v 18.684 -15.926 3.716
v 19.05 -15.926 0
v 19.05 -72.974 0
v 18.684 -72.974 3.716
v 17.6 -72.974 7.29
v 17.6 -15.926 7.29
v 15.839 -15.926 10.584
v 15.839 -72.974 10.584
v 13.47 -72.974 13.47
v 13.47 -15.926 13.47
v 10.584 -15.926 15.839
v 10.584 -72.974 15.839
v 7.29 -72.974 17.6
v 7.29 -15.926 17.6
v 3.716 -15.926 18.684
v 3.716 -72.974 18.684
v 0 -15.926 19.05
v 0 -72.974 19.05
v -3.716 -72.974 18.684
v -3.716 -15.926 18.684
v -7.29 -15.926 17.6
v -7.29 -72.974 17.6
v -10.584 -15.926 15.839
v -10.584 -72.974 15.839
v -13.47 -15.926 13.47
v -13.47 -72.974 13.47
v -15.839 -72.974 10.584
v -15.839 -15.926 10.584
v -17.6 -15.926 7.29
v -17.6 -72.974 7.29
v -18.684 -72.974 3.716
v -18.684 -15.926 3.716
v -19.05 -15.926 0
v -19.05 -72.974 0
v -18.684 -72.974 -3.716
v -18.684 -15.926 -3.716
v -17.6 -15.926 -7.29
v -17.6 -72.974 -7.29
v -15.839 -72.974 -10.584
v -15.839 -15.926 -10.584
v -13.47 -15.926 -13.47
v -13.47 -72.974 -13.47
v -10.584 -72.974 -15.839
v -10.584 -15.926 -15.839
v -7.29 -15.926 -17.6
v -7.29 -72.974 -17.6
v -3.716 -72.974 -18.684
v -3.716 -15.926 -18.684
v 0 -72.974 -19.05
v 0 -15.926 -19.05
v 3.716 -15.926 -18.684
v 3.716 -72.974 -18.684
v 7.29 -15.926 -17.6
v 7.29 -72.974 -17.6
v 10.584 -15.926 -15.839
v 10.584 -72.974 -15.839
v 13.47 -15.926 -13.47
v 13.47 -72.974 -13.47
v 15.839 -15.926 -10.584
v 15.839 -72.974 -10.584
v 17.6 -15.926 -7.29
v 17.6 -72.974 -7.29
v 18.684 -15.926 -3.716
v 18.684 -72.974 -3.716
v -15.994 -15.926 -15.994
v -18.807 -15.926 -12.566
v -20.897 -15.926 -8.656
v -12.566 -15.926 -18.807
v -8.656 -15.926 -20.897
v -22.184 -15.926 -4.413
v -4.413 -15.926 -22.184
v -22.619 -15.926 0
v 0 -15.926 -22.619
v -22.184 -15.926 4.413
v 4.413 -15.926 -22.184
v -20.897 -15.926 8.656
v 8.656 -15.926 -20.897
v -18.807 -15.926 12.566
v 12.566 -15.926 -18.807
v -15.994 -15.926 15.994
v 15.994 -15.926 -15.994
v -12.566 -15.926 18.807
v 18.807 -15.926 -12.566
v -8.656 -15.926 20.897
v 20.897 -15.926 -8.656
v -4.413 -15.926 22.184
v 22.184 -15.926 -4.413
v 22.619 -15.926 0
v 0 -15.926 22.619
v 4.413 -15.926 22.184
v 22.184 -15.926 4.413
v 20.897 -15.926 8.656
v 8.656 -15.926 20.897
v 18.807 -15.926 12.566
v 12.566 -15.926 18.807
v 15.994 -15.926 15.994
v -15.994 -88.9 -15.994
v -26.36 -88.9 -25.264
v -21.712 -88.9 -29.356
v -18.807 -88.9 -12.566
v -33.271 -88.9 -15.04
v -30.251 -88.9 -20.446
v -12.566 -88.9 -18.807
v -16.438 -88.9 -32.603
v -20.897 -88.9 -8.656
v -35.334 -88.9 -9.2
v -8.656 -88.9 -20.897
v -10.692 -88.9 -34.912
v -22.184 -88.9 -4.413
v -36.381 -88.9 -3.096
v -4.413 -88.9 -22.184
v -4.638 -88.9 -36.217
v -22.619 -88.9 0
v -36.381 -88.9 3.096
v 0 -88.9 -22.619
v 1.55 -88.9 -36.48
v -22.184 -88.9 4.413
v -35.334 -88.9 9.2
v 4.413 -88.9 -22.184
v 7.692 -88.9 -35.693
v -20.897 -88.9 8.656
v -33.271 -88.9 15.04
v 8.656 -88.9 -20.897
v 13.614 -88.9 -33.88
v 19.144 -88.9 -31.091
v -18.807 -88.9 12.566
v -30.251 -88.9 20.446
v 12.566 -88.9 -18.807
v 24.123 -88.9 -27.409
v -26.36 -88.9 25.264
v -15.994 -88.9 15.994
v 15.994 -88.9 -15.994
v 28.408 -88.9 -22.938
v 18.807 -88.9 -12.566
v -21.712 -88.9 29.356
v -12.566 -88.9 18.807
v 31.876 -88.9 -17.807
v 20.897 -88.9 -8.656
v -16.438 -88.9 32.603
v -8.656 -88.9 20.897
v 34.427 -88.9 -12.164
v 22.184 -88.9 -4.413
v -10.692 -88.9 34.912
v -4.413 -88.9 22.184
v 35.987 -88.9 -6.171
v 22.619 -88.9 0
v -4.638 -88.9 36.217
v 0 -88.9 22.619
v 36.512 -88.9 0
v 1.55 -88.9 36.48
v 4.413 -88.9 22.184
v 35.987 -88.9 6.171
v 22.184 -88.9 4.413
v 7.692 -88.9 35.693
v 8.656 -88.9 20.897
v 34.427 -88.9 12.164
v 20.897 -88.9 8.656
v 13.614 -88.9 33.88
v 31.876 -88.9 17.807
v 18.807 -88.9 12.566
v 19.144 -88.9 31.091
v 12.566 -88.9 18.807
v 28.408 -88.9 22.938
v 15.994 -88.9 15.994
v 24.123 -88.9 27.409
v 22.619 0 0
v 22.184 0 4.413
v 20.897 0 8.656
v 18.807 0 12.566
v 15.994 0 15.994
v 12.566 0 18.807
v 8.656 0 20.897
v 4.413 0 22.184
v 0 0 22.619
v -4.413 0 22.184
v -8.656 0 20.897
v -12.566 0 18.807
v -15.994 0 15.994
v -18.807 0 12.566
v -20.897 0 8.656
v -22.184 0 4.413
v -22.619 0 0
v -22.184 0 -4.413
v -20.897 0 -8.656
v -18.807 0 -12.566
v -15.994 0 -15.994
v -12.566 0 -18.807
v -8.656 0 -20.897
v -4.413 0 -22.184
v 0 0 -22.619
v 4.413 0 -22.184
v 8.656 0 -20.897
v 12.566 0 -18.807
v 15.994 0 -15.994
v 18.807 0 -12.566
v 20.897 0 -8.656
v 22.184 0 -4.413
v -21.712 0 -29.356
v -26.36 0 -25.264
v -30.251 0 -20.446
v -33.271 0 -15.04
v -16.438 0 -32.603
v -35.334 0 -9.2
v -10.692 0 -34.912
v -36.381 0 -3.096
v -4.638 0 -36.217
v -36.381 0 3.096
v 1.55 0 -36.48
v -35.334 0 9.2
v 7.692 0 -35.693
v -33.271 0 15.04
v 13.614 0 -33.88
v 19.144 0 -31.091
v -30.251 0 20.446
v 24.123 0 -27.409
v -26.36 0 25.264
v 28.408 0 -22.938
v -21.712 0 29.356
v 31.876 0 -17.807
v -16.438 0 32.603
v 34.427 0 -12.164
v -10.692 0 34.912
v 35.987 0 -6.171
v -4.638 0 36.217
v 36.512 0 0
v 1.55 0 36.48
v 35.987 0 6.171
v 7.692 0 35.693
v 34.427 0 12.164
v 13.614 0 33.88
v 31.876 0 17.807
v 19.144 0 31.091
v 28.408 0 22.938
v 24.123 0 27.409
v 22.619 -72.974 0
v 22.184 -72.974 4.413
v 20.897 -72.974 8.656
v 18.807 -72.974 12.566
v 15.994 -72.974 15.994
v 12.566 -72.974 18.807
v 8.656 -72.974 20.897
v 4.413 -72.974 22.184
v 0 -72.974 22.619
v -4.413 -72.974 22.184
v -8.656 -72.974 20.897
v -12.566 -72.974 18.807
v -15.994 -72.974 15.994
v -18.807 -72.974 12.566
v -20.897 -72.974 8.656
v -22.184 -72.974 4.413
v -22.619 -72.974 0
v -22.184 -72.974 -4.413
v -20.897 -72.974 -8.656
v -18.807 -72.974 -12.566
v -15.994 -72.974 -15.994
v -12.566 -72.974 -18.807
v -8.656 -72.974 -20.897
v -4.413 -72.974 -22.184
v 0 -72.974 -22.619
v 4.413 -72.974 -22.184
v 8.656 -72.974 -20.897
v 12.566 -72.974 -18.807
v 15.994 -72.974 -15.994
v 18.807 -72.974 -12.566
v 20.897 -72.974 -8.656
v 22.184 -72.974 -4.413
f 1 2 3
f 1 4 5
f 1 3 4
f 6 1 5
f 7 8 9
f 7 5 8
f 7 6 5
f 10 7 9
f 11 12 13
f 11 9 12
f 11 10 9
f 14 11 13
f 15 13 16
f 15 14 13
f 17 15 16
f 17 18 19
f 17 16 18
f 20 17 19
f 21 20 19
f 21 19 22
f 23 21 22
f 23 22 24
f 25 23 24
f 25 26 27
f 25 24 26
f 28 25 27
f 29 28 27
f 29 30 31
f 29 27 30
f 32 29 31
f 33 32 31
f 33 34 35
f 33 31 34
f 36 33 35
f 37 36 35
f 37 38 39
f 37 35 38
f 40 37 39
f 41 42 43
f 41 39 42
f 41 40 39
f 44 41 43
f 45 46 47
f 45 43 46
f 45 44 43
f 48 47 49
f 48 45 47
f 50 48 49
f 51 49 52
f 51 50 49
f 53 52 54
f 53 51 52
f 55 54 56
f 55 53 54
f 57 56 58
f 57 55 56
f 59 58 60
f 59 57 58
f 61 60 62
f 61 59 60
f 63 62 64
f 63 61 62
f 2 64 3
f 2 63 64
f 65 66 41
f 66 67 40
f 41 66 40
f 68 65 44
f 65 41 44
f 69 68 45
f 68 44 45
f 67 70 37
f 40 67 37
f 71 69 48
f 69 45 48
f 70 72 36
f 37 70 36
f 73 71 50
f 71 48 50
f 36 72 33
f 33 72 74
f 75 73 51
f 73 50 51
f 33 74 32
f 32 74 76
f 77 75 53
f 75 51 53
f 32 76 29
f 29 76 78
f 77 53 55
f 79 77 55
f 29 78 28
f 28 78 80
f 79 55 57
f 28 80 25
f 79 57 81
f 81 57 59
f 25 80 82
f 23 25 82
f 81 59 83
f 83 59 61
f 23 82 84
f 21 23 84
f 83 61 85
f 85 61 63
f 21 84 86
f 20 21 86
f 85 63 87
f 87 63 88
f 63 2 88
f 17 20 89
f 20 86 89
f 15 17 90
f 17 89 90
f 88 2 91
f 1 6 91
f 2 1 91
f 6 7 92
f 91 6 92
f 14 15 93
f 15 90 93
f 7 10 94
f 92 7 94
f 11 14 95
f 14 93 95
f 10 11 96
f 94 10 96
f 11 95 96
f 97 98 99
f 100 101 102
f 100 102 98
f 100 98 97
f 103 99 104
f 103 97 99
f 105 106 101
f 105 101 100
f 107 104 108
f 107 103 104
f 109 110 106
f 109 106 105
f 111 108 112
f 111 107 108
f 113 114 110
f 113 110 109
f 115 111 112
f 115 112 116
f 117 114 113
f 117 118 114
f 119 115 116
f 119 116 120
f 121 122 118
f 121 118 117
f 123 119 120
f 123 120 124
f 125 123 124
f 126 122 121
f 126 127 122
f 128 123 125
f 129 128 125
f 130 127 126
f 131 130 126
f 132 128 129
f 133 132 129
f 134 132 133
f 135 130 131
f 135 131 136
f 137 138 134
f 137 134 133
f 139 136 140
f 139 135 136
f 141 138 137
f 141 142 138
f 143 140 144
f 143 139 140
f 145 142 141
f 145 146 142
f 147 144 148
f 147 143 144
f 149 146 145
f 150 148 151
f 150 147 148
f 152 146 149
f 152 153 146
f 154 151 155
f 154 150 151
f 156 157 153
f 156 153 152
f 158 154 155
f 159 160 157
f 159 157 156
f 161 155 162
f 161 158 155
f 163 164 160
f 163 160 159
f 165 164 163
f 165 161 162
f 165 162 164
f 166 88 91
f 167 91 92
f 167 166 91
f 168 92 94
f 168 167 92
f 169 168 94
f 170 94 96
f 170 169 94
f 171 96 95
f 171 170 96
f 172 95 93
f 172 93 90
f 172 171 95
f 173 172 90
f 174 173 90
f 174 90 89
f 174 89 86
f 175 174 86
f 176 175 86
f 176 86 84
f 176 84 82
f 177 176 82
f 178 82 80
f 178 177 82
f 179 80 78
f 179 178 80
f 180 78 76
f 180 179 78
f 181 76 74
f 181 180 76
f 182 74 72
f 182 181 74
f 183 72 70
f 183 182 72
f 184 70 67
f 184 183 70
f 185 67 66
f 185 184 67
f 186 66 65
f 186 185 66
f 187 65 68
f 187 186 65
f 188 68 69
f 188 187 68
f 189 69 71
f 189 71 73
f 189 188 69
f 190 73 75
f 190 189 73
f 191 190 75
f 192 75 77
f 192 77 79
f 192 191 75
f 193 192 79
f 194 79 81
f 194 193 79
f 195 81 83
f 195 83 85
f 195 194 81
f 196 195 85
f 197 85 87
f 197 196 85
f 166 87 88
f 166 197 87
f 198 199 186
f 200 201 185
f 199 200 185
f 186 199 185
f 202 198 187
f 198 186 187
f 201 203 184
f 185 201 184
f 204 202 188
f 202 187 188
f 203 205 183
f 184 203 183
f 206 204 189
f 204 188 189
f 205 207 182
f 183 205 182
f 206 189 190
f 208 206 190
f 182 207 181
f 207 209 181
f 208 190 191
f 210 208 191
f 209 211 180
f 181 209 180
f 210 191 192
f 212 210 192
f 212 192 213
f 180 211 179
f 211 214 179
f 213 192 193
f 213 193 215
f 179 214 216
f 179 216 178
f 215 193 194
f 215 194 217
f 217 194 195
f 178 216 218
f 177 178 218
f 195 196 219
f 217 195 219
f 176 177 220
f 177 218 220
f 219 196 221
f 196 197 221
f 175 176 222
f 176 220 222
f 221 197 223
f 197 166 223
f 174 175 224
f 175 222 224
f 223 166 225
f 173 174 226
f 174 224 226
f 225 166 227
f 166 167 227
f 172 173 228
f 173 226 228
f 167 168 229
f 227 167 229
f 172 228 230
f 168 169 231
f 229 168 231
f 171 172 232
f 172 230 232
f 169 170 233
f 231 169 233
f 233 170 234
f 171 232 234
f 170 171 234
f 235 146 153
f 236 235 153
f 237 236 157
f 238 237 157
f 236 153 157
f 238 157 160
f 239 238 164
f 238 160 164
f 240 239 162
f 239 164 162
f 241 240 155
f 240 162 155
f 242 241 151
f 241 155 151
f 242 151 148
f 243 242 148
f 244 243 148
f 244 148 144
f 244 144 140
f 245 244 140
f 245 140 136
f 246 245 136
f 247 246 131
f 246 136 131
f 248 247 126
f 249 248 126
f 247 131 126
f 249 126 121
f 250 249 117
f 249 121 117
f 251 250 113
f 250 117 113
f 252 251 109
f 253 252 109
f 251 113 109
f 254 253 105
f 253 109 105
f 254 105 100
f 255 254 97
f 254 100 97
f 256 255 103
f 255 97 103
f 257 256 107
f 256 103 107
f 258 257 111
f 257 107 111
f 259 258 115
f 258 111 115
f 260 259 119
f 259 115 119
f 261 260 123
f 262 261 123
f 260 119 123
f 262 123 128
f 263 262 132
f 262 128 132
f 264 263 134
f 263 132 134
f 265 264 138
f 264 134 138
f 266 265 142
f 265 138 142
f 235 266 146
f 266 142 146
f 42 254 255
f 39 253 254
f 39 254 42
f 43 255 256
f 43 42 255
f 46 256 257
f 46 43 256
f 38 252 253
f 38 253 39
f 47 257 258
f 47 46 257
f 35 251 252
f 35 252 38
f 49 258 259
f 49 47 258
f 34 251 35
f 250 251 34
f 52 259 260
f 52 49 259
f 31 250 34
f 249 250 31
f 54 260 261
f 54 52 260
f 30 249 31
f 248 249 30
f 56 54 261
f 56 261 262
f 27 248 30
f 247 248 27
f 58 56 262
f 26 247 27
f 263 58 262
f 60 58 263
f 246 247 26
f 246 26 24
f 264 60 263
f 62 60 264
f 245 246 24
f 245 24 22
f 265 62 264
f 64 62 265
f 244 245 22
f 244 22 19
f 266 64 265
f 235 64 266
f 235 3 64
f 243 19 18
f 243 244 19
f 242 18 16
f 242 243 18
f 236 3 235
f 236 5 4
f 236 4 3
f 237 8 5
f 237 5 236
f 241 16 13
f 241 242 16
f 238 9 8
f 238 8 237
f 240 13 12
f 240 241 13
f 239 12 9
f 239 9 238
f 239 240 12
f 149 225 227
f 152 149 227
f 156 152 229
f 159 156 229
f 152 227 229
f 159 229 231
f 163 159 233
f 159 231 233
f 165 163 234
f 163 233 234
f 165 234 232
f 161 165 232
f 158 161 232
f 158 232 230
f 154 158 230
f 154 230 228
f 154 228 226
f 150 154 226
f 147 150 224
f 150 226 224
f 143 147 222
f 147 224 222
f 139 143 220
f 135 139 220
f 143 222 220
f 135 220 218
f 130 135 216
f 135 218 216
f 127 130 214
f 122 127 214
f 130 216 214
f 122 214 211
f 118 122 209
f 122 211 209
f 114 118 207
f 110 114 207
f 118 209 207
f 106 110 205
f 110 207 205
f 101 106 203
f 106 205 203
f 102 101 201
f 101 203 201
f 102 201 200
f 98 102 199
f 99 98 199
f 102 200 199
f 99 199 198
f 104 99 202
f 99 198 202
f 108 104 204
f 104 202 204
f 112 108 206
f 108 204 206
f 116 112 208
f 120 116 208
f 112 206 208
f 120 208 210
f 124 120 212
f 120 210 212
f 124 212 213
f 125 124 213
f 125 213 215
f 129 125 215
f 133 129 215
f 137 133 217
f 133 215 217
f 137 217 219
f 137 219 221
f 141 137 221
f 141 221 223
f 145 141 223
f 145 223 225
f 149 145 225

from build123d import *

# Parameters (mm, degrees)
F0_R     = 36.5125
F1_DEPTH = 88.9
F2_R     = 19.05
F3_DEPTH = 88.901
F4_R     = 22.6187
F5_DEPTH = 15.9258


# Not quite as in the source:
# - a pattern or mirror of a feature is missing from the dataset's text; its kind, count and spacing are read off the source's solid


with BuildPart() as f1:
    # F0 (on Front) → F1 (new body)
    with BuildSketch(Plane.XZ):
        Circle(F0_R)
    extrude(amount=F1_DEPTH)

    # F2 (on Front) → F3 (cut, through all)
    with BuildSketch(Plane.XZ):
        Circle(F2_R)
    extrude(amount=F3_DEPTH, mode=Mode.SUBTRACT)

    # F4 (on Front) → F5 (cut)
    with BuildSketch(Plane.XZ):
        Circle(F4_R)
    f5 = extrude(amount=F5_DEPTH, mode=Mode.SUBTRACT)

    # F5_copies: F5 across plane
    add(f5.mirror(Plane(origin=(0, -44.45, 0), x_dir=(0, 0, -1), z_dir=(0, -1, 0))), mode=Mode.SUBTRACT)


solid = f1.part
